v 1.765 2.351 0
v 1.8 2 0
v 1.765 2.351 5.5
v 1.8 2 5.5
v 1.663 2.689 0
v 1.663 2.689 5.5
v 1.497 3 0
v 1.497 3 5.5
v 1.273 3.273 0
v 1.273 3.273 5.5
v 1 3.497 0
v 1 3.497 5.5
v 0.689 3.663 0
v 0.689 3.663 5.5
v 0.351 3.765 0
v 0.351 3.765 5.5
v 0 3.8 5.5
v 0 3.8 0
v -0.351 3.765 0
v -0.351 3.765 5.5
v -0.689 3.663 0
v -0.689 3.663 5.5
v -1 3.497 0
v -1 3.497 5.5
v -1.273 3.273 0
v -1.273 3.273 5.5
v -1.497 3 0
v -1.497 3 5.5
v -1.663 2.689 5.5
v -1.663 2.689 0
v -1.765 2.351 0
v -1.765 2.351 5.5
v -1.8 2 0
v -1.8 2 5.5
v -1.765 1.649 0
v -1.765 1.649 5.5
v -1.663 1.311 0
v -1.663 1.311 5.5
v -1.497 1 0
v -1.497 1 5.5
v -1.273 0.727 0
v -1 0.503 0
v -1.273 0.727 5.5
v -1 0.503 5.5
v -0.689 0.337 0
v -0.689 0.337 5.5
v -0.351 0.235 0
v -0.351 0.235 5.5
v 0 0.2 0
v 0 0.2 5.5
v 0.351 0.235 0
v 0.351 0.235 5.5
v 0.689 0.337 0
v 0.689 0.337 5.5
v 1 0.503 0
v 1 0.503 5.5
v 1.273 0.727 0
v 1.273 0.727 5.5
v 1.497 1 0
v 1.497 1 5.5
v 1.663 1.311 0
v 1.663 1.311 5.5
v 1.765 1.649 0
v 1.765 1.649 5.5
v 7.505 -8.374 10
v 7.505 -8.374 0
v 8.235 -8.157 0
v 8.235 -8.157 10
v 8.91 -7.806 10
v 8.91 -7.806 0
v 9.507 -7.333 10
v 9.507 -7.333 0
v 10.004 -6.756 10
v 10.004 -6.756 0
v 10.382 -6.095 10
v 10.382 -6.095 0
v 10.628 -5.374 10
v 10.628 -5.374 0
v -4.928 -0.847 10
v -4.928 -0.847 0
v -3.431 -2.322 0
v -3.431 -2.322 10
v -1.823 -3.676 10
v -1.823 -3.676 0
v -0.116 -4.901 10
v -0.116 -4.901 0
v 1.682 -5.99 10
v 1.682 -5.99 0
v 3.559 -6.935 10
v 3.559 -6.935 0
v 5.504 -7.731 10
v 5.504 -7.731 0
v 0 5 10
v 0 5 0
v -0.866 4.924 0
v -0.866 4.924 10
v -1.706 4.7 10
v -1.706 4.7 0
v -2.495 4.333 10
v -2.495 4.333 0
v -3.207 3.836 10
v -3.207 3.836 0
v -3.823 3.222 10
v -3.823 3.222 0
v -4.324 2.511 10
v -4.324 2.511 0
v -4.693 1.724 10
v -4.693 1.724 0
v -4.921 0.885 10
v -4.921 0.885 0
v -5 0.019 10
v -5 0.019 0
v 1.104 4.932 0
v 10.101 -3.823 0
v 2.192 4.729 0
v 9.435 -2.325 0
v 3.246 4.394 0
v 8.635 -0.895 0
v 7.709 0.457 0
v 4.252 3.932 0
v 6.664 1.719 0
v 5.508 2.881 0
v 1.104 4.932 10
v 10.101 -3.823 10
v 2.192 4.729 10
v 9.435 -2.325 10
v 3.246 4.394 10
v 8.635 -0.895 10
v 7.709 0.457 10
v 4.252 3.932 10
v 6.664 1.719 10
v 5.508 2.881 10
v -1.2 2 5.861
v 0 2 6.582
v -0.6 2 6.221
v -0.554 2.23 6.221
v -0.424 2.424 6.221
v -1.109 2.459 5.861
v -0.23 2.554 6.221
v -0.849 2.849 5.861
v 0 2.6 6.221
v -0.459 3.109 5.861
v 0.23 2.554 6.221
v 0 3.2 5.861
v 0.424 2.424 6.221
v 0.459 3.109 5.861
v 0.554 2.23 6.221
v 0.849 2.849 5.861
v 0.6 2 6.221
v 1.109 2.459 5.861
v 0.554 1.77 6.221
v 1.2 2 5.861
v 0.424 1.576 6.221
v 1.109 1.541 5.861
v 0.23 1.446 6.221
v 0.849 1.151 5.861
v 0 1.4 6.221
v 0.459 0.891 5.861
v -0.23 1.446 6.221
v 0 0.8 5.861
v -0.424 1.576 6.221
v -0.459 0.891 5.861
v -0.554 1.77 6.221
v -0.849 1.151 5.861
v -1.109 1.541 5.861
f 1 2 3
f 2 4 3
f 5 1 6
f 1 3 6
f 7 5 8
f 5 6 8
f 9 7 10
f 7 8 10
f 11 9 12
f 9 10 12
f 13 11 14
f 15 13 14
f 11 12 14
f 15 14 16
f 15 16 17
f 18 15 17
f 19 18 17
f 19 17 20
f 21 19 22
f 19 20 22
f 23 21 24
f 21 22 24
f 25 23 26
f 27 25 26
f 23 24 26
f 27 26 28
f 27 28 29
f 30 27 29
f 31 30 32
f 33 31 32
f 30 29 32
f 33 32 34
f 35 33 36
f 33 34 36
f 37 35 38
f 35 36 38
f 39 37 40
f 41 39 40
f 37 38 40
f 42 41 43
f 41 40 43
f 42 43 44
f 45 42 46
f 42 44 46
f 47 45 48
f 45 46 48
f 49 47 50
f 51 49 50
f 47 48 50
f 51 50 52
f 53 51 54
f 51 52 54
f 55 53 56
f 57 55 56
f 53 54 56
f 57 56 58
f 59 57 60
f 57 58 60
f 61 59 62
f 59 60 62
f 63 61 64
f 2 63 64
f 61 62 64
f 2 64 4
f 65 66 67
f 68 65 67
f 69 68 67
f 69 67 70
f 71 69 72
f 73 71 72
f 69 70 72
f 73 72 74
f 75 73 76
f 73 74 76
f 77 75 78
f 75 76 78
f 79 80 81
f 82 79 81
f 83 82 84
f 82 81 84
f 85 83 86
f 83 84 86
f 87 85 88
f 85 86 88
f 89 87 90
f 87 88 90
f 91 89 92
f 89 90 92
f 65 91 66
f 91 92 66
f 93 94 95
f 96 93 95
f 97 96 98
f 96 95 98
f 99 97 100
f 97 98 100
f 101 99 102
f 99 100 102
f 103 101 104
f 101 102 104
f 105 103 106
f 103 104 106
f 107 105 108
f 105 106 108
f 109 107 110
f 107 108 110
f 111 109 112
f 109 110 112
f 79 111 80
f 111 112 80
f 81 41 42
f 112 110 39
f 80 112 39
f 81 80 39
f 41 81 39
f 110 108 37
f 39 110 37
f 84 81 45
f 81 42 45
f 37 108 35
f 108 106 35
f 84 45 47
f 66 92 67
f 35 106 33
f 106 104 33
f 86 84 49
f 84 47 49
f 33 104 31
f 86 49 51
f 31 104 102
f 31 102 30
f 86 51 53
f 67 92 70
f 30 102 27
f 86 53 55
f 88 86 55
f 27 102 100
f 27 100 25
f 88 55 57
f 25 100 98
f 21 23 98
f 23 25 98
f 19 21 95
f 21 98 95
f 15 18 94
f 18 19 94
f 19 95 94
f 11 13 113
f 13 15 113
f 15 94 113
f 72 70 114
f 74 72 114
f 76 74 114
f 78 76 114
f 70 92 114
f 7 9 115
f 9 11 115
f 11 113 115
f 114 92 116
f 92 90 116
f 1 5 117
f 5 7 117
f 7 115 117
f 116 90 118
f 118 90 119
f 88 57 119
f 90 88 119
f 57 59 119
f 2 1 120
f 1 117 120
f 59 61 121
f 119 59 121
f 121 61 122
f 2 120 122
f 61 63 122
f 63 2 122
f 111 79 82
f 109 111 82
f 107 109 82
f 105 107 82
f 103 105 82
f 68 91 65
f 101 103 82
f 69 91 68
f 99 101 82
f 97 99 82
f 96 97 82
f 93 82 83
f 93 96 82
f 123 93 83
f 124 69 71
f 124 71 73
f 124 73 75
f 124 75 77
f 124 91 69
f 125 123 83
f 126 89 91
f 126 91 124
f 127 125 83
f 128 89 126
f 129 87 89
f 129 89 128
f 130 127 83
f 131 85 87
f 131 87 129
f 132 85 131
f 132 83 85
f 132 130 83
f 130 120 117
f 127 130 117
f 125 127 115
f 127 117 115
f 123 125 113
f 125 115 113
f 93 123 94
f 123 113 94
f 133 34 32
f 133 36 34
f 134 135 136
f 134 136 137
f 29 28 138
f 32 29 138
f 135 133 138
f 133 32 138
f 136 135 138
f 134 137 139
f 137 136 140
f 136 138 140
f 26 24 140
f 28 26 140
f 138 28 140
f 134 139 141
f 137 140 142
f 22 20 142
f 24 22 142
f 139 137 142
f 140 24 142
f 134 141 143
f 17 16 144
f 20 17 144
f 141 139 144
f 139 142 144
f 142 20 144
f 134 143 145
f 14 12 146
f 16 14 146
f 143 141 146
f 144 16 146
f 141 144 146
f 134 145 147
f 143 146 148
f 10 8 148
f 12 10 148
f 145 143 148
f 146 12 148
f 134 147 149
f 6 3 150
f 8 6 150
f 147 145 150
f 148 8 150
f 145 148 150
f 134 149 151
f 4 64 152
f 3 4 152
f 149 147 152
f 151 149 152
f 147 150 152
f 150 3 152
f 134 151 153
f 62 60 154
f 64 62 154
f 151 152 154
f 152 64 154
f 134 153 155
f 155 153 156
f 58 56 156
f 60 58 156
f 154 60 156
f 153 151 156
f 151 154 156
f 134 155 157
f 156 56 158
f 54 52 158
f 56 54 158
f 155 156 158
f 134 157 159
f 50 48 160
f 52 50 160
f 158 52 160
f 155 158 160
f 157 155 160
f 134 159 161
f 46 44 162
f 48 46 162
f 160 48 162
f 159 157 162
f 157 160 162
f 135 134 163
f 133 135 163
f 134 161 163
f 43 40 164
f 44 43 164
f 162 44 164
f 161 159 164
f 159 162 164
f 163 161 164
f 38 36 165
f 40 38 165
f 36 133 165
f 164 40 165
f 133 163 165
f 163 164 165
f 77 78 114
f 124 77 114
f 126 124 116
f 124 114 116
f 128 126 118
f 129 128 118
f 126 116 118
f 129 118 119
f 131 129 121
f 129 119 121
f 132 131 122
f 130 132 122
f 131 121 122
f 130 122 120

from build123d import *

# Parameters (mm, degrees)
BOSS_EXTRUDE3_DEPTH      = 10
M3_CLEARANCE_HOLE1_D     = 3.6
M3_CLEARANCE_HOLE1_DEPTH = 5.5
M3_CLEARANCE_HOLE1_TIP   = 1.081549114


with BuildPart() as part:
    # Sketch3 → Boss-Extrude3 (new body)
    with BuildSketch(Plane.XY):
        with BuildLine():
            ThreePointArc((10.627637959, -5.374147741), (8.187588203, -0.208463055), (4.251688797, 3.93241088))
            ThreePointArc((4.251688797, 3.93241088), (2.191837366, 4.729023368), (0, 5))
            ThreePointArc((0, 5), (-3.823420235, 3.222026956), (-4.927665225, -0.847416917))
            ThreePointArc((-4.927665225, -0.847416917), (0.77252532, -5.462986054), (7.504596942, -8.374147741))
            ThreePointArc((7.504596942, -8.374147741), (9.507210052, -7.33333117), (10.627637959, -5.374147741))
        make_face()
    extrude(amount=BOSS_EXTRUDE3_DEPTH)

    # M3 Clearance Hole1
    with Locations(Plane(origin=(0, 0, 0), x_dir=(-1, 0, 0), z_dir=(0, 0, -1))):
        with Locations((0, 2)):
            Hole(M3_CLEARANCE_HOLE1_D / 2, depth=M3_CLEARANCE_HOLE1_DEPTH)
            with Locations((0, 0, -(M3_CLEARANCE_HOLE1_DEPTH + M3_CLEARANCE_HOLE1_TIP / 2))):  # 118° drill point
                Cone(0, M3_CLEARANCE_HOLE1_D / 2, M3_CLEARANCE_HOLE1_TIP, mode=Mode.SUBTRACT)


solid = part.part
